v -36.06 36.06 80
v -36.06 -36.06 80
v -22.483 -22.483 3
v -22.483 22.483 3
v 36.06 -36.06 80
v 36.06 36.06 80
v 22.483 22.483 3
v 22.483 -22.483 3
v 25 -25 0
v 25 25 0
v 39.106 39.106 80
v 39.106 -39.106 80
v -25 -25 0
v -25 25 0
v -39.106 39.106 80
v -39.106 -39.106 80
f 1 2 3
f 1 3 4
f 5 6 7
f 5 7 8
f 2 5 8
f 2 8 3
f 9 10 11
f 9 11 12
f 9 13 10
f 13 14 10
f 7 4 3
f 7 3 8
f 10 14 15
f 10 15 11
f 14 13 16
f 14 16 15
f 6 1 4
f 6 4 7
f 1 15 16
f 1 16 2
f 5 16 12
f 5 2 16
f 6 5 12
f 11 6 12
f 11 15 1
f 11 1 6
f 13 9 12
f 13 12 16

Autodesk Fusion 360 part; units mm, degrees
sketch "스케치1" plane through (0, 0, 0) normal (0, 0, 1) x (1, 0, 0)
  line L0 (-25, 25) -> (25, 25)
  line L1 (25, 25) -> (25, -25)
  line L2 (25, -25) -> (-25, -25)
  line L3 (-25, -25) -> (-25, 25)
sketch "스케치2" plane through (0, 0, 0) normal (0, 0, 1) x (1, 0, 0)
  line L0 (-54.7462, 3.4053) -> (-38.8986, -3.0124)
  line L1 (-38.8986, -3.0124) -> (-94.0377, -2.8814)
  line L2 (-94.0377, -2.8814) -> (-70, 5)
  line L3 (-70, 5) -> (-70, -25)
  line L4 (-70, -25) -> (-54.7462, 3.4053)
extrude "돌출1" add sketch "스케치1" along normal blind 30 draft 10
extrude "돌출2" add 1 faces at (-10.0966, 10.0966, 30) along direction (0, 0, 1) blind 50 draft 10
shell "쉘1" thickness 3 removed faces 1 at (-13.0354, 13.0354, 80)
